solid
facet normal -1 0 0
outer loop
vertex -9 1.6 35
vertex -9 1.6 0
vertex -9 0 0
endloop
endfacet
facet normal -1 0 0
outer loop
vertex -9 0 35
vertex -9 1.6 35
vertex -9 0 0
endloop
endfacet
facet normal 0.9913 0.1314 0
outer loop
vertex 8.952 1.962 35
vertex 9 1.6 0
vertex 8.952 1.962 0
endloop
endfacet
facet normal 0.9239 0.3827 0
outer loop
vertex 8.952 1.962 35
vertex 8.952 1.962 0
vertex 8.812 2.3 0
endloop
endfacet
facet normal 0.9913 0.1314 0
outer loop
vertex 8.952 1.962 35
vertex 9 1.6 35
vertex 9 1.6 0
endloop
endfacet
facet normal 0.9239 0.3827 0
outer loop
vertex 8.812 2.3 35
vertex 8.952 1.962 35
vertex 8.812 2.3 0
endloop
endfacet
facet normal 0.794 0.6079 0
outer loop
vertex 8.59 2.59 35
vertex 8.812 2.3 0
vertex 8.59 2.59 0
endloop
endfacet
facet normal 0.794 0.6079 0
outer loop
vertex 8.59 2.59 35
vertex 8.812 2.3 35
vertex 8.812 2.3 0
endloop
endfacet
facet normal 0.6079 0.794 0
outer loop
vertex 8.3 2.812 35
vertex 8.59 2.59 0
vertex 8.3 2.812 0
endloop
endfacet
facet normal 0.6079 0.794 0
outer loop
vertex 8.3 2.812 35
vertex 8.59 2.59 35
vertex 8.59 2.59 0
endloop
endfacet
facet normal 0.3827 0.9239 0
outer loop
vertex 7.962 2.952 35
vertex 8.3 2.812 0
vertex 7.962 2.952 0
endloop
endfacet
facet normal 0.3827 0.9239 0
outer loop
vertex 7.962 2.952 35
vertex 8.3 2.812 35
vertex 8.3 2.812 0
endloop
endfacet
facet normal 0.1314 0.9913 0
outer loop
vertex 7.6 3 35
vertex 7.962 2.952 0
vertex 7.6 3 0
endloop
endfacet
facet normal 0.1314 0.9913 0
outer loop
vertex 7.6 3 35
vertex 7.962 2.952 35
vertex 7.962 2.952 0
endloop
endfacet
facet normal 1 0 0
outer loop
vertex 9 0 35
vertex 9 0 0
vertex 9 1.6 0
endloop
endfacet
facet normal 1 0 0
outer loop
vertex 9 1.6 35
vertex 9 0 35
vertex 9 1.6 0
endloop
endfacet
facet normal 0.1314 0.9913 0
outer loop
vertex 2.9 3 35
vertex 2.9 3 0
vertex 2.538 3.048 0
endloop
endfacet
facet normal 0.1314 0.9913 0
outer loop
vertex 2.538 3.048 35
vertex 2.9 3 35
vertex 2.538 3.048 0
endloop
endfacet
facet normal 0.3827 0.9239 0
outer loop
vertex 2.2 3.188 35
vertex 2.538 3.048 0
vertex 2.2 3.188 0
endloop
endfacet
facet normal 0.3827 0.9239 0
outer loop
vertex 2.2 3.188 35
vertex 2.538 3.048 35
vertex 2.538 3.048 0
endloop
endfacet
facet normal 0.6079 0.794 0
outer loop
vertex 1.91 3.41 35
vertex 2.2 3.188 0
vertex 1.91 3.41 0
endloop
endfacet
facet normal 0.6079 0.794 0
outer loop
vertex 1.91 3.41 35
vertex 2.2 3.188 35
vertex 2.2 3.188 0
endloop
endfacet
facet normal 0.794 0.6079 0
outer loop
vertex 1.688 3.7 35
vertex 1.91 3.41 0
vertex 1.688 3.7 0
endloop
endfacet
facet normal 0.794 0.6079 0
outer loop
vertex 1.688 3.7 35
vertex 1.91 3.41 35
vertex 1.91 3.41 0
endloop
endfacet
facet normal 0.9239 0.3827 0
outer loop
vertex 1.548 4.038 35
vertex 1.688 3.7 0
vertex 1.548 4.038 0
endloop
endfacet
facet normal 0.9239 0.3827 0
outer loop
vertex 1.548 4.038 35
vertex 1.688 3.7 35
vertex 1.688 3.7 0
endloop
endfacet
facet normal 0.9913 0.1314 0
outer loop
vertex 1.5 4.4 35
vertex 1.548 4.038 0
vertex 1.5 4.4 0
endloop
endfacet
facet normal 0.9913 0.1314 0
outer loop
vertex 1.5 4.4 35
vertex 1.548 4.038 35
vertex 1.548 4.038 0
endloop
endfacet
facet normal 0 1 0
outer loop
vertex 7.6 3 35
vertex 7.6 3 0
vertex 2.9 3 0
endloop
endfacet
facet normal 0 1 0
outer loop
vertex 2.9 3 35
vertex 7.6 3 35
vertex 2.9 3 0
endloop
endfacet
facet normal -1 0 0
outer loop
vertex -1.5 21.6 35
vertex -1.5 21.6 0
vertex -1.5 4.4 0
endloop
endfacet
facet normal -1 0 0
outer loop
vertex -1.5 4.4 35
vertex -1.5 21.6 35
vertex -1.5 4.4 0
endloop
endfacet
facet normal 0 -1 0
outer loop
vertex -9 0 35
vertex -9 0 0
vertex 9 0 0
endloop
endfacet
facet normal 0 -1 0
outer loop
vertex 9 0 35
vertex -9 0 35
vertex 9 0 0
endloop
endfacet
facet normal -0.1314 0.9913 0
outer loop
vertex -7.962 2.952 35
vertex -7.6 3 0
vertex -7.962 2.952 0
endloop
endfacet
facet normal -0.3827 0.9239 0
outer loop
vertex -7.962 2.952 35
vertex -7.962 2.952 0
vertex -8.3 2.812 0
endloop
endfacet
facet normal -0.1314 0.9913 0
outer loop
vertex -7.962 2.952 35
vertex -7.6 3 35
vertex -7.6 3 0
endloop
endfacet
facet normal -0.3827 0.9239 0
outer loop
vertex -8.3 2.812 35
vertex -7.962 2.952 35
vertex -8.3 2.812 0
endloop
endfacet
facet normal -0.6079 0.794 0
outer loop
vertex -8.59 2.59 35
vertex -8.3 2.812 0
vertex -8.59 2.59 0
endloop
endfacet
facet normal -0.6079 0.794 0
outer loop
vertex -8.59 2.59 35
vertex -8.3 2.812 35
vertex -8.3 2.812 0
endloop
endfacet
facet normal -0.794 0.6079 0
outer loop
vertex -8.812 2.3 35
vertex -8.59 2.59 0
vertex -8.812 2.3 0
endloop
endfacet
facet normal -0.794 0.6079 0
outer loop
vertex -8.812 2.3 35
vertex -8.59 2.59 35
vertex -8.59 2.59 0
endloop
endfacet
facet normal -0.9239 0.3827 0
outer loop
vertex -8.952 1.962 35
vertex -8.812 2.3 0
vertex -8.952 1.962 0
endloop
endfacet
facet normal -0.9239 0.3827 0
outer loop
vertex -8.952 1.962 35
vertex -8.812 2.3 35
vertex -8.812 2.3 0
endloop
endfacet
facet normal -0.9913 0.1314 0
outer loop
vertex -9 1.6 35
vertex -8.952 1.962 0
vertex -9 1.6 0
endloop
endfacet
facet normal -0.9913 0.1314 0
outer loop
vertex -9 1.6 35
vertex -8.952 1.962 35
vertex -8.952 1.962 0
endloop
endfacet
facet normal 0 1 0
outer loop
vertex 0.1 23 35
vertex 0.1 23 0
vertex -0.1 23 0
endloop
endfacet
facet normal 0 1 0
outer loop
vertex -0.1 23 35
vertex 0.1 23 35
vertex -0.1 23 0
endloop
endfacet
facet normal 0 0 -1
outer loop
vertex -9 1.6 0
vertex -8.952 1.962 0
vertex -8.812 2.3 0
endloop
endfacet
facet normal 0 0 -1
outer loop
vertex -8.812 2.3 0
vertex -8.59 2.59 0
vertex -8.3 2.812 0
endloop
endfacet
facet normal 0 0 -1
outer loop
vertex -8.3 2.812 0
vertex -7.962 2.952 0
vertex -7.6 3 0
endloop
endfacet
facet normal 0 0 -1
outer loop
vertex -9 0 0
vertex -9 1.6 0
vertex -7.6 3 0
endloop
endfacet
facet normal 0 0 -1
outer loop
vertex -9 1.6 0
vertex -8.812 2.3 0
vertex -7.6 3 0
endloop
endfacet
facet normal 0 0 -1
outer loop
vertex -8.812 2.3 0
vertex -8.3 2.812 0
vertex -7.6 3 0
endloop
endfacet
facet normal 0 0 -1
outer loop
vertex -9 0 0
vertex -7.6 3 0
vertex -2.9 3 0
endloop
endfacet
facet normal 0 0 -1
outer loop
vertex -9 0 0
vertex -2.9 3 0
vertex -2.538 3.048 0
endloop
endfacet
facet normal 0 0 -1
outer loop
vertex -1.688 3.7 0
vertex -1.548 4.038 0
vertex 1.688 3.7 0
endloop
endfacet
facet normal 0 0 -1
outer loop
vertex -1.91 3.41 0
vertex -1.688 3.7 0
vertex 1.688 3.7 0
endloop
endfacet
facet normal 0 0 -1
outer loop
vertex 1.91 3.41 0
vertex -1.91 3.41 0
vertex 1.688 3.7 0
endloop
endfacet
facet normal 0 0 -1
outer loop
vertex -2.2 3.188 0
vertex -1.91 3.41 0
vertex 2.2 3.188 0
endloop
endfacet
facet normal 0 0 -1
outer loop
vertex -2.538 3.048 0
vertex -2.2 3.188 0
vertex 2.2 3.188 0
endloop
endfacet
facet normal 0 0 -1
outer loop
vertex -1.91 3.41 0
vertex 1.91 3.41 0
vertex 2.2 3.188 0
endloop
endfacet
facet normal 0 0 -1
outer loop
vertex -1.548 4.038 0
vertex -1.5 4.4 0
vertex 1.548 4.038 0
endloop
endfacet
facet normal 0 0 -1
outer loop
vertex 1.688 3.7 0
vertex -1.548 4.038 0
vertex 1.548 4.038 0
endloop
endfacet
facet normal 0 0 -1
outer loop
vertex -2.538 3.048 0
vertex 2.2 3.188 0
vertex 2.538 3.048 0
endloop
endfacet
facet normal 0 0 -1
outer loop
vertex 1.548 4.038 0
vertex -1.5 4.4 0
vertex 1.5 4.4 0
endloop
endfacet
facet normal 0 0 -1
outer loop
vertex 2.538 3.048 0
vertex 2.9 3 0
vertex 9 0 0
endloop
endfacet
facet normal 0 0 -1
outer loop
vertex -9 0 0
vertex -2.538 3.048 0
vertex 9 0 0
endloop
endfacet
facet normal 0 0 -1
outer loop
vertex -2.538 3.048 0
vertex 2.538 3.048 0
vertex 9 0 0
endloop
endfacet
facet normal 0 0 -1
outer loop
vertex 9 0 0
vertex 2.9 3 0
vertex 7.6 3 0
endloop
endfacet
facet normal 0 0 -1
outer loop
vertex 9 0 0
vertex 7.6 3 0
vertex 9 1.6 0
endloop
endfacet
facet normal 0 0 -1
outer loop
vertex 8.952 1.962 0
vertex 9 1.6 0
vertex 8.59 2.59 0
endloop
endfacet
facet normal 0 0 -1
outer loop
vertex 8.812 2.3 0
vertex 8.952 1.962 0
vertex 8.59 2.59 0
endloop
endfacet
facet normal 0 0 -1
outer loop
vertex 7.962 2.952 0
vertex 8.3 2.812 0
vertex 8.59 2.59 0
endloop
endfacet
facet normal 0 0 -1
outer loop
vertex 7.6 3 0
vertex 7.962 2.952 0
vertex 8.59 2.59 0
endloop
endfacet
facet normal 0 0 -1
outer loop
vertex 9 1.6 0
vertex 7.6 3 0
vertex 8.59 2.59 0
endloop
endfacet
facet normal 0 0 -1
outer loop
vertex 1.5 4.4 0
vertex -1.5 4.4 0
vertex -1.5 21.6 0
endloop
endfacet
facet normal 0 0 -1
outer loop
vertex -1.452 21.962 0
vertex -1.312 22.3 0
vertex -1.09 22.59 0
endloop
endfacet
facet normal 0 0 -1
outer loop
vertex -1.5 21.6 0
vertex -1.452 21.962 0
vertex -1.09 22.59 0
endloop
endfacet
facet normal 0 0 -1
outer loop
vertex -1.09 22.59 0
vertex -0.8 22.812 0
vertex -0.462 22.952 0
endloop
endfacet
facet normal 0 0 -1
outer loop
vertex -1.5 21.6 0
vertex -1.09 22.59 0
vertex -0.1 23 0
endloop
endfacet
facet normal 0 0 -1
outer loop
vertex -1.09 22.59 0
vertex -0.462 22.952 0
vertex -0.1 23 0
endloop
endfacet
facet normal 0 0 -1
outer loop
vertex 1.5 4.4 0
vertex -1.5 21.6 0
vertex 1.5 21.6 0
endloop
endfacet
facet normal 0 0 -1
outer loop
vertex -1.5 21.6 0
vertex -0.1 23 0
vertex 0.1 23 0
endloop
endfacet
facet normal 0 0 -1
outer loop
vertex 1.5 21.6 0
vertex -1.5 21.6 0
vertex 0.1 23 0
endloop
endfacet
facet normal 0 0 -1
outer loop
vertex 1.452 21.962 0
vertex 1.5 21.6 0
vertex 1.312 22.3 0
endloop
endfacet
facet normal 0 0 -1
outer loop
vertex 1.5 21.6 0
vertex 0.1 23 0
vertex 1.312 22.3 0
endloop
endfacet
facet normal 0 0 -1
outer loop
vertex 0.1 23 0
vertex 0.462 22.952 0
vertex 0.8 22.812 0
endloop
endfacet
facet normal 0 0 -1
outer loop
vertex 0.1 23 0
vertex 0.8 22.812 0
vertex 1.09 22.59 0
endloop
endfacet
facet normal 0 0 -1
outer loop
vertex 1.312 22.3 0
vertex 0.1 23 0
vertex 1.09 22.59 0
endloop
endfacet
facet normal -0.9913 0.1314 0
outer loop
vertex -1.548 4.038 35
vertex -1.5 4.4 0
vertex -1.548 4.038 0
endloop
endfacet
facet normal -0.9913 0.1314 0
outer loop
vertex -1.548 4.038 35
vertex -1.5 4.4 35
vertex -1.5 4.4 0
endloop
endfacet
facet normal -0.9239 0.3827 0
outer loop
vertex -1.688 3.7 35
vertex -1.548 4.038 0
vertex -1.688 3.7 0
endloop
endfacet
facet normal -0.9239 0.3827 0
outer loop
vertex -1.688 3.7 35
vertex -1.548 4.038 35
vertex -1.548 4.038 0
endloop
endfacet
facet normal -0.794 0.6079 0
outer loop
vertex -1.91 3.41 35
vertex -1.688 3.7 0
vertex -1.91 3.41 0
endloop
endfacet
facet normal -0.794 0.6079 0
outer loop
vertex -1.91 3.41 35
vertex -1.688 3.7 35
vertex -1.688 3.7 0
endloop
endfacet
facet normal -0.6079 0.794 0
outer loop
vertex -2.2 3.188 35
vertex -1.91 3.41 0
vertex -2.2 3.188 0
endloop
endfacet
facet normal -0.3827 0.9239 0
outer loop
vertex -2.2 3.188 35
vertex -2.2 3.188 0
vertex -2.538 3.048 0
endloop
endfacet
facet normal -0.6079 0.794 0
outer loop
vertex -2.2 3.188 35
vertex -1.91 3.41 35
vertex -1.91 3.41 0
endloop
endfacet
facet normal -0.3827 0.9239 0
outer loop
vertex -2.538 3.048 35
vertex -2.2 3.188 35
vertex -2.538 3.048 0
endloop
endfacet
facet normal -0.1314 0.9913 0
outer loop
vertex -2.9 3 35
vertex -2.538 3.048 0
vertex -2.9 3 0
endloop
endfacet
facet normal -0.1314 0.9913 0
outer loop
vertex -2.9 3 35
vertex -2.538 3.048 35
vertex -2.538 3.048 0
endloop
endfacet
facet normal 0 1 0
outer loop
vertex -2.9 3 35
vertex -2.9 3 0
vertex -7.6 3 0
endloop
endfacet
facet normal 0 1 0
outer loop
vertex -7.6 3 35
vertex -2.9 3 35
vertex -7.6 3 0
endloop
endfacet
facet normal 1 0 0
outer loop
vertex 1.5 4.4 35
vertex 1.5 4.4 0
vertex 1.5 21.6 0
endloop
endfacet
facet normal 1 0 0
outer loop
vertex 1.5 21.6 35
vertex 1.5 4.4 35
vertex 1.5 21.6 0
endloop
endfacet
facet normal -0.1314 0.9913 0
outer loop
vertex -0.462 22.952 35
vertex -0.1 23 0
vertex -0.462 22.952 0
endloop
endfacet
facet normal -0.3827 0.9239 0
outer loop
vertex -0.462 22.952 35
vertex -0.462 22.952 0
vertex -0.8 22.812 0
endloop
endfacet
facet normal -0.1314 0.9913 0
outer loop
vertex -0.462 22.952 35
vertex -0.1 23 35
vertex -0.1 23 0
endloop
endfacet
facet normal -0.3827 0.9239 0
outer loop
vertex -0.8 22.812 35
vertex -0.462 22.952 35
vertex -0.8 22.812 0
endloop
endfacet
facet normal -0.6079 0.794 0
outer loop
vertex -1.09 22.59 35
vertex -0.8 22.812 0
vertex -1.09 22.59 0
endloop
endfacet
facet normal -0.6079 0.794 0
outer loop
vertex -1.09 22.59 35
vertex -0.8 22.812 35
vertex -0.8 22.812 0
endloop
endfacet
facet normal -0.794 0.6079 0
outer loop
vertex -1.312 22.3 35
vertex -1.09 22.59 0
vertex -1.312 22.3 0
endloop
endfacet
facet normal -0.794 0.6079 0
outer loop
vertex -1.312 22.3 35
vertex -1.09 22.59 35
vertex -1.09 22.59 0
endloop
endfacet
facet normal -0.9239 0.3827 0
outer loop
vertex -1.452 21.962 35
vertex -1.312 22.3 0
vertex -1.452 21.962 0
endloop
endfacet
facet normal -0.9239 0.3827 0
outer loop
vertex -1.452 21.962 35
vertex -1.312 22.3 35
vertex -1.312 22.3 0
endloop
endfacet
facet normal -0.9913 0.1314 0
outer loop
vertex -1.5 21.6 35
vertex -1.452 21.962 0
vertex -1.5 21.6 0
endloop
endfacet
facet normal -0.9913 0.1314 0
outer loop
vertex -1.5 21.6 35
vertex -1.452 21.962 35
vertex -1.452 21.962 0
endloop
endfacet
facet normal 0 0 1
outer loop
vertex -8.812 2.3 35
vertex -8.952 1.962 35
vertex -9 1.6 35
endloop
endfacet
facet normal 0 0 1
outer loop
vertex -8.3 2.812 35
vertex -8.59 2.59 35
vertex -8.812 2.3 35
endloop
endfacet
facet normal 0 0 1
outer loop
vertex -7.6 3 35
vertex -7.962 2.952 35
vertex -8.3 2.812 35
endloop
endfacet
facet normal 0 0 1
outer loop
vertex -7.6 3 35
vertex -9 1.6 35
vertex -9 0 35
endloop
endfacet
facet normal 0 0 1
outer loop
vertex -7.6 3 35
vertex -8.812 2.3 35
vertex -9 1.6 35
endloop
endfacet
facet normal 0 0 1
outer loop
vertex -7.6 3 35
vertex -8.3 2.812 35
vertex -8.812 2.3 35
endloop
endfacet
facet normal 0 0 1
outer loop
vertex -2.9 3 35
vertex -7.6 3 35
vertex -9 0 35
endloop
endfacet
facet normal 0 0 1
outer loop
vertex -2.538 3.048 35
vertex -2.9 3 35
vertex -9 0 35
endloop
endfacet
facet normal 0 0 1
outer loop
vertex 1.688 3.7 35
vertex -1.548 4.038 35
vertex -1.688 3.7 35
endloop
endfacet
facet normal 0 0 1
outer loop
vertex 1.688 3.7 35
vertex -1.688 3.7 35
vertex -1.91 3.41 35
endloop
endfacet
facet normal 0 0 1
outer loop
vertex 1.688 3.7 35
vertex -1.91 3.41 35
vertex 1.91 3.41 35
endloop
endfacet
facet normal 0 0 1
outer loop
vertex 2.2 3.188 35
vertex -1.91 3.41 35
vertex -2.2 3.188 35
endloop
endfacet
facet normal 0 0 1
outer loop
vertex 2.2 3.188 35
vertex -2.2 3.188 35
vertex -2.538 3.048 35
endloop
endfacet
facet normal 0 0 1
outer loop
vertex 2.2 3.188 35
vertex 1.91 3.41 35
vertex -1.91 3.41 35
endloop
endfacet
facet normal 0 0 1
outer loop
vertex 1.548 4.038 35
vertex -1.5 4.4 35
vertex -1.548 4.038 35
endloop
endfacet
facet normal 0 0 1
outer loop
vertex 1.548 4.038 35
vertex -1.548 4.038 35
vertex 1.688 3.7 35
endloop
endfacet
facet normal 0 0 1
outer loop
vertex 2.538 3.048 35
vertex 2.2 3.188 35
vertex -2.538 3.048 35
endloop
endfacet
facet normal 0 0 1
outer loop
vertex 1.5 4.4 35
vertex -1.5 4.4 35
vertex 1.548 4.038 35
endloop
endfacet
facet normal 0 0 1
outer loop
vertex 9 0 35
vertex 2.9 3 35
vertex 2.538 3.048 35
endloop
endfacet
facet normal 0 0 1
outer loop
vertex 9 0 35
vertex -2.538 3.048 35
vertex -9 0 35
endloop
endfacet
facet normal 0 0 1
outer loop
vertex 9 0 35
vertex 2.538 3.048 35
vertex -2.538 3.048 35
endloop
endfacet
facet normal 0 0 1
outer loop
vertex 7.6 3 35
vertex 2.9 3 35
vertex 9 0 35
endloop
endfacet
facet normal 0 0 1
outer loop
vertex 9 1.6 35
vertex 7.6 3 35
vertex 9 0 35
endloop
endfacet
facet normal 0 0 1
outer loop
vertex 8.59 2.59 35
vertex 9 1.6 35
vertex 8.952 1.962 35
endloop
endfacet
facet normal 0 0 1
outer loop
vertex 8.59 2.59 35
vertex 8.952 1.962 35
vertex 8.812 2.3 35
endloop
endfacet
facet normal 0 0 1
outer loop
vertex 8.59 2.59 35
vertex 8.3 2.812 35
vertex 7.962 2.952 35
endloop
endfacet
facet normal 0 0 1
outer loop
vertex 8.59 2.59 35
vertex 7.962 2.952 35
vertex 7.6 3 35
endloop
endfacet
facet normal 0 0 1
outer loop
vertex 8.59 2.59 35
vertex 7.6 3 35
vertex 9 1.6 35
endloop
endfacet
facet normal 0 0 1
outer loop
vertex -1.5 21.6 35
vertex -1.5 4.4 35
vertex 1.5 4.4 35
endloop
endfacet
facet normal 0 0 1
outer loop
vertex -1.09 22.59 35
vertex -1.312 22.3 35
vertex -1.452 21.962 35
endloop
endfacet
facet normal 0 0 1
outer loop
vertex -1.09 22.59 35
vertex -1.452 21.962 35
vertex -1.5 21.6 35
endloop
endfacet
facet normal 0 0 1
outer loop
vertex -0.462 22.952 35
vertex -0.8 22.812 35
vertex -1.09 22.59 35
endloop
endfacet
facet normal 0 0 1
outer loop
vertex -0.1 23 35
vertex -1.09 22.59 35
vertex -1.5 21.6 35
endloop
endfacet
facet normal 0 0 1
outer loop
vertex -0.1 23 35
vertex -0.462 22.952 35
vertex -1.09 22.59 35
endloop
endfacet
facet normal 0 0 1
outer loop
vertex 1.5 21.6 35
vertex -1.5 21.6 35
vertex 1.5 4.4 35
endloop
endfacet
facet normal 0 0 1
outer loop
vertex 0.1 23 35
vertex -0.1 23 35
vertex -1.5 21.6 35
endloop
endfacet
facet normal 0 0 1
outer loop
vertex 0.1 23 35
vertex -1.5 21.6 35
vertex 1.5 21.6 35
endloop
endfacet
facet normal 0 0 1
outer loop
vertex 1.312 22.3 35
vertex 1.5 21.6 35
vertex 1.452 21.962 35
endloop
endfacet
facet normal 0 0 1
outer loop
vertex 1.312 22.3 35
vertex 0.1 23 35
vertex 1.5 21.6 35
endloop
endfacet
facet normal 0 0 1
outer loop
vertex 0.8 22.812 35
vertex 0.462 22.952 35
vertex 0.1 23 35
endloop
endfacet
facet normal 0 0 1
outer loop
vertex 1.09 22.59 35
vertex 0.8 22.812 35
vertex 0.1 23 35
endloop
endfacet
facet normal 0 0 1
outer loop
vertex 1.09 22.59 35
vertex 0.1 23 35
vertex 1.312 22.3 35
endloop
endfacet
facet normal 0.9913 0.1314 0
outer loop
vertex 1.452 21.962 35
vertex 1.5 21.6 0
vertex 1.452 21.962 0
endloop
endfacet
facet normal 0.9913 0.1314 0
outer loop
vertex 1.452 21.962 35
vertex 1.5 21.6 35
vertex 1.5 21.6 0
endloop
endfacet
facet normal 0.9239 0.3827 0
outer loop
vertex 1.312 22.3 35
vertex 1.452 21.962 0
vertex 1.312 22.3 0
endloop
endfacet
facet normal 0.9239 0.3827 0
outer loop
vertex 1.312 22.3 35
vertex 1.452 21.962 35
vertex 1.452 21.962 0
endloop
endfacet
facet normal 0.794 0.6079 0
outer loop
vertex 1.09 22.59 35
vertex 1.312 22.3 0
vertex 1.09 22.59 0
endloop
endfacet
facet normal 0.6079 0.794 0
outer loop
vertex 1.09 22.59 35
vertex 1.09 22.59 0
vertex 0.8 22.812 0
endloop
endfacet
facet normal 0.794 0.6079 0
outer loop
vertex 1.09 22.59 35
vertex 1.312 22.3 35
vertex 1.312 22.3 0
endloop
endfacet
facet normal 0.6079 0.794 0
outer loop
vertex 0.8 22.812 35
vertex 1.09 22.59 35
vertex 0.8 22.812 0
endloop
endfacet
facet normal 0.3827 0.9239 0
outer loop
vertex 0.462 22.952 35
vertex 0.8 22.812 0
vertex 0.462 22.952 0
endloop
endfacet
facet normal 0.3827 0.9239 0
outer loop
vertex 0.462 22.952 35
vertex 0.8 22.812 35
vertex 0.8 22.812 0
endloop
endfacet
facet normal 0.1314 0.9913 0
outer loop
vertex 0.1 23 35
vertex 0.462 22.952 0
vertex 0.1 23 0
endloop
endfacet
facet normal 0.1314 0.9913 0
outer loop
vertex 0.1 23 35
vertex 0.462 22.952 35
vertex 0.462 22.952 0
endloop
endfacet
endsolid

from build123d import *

# Parameters (mm, degrees)
PAD_DEPTH = 35
FILLET_R  = 1.4


with BuildPart() as part:
    # Sketch → Pad (new body)
    with BuildSketch(Plane.XY):
        Polygon((-9, 0), (9, 0), (9, 3), (1.5, 3), (1.5, 23), (-1.5, 23), (-1.5, 3), (-9, 3), align=None)
    extrude(amount=PAD_DEPTH)

    # Fillet
    fillet_edges = [part.edges().sort_by_distance(p)[0] for p in [
        (9, 3, 17.5),
        (-9, 3, 17.5),
        (1.5, 3, 17.5),
        (-1.5, 3, 17.5),
        (1.5, 23, 17.5),
        (-1.5, 23, 17.5),
    ]]
    fillet(fillet_edges, radius=FILLET_R)


solid = part.part
